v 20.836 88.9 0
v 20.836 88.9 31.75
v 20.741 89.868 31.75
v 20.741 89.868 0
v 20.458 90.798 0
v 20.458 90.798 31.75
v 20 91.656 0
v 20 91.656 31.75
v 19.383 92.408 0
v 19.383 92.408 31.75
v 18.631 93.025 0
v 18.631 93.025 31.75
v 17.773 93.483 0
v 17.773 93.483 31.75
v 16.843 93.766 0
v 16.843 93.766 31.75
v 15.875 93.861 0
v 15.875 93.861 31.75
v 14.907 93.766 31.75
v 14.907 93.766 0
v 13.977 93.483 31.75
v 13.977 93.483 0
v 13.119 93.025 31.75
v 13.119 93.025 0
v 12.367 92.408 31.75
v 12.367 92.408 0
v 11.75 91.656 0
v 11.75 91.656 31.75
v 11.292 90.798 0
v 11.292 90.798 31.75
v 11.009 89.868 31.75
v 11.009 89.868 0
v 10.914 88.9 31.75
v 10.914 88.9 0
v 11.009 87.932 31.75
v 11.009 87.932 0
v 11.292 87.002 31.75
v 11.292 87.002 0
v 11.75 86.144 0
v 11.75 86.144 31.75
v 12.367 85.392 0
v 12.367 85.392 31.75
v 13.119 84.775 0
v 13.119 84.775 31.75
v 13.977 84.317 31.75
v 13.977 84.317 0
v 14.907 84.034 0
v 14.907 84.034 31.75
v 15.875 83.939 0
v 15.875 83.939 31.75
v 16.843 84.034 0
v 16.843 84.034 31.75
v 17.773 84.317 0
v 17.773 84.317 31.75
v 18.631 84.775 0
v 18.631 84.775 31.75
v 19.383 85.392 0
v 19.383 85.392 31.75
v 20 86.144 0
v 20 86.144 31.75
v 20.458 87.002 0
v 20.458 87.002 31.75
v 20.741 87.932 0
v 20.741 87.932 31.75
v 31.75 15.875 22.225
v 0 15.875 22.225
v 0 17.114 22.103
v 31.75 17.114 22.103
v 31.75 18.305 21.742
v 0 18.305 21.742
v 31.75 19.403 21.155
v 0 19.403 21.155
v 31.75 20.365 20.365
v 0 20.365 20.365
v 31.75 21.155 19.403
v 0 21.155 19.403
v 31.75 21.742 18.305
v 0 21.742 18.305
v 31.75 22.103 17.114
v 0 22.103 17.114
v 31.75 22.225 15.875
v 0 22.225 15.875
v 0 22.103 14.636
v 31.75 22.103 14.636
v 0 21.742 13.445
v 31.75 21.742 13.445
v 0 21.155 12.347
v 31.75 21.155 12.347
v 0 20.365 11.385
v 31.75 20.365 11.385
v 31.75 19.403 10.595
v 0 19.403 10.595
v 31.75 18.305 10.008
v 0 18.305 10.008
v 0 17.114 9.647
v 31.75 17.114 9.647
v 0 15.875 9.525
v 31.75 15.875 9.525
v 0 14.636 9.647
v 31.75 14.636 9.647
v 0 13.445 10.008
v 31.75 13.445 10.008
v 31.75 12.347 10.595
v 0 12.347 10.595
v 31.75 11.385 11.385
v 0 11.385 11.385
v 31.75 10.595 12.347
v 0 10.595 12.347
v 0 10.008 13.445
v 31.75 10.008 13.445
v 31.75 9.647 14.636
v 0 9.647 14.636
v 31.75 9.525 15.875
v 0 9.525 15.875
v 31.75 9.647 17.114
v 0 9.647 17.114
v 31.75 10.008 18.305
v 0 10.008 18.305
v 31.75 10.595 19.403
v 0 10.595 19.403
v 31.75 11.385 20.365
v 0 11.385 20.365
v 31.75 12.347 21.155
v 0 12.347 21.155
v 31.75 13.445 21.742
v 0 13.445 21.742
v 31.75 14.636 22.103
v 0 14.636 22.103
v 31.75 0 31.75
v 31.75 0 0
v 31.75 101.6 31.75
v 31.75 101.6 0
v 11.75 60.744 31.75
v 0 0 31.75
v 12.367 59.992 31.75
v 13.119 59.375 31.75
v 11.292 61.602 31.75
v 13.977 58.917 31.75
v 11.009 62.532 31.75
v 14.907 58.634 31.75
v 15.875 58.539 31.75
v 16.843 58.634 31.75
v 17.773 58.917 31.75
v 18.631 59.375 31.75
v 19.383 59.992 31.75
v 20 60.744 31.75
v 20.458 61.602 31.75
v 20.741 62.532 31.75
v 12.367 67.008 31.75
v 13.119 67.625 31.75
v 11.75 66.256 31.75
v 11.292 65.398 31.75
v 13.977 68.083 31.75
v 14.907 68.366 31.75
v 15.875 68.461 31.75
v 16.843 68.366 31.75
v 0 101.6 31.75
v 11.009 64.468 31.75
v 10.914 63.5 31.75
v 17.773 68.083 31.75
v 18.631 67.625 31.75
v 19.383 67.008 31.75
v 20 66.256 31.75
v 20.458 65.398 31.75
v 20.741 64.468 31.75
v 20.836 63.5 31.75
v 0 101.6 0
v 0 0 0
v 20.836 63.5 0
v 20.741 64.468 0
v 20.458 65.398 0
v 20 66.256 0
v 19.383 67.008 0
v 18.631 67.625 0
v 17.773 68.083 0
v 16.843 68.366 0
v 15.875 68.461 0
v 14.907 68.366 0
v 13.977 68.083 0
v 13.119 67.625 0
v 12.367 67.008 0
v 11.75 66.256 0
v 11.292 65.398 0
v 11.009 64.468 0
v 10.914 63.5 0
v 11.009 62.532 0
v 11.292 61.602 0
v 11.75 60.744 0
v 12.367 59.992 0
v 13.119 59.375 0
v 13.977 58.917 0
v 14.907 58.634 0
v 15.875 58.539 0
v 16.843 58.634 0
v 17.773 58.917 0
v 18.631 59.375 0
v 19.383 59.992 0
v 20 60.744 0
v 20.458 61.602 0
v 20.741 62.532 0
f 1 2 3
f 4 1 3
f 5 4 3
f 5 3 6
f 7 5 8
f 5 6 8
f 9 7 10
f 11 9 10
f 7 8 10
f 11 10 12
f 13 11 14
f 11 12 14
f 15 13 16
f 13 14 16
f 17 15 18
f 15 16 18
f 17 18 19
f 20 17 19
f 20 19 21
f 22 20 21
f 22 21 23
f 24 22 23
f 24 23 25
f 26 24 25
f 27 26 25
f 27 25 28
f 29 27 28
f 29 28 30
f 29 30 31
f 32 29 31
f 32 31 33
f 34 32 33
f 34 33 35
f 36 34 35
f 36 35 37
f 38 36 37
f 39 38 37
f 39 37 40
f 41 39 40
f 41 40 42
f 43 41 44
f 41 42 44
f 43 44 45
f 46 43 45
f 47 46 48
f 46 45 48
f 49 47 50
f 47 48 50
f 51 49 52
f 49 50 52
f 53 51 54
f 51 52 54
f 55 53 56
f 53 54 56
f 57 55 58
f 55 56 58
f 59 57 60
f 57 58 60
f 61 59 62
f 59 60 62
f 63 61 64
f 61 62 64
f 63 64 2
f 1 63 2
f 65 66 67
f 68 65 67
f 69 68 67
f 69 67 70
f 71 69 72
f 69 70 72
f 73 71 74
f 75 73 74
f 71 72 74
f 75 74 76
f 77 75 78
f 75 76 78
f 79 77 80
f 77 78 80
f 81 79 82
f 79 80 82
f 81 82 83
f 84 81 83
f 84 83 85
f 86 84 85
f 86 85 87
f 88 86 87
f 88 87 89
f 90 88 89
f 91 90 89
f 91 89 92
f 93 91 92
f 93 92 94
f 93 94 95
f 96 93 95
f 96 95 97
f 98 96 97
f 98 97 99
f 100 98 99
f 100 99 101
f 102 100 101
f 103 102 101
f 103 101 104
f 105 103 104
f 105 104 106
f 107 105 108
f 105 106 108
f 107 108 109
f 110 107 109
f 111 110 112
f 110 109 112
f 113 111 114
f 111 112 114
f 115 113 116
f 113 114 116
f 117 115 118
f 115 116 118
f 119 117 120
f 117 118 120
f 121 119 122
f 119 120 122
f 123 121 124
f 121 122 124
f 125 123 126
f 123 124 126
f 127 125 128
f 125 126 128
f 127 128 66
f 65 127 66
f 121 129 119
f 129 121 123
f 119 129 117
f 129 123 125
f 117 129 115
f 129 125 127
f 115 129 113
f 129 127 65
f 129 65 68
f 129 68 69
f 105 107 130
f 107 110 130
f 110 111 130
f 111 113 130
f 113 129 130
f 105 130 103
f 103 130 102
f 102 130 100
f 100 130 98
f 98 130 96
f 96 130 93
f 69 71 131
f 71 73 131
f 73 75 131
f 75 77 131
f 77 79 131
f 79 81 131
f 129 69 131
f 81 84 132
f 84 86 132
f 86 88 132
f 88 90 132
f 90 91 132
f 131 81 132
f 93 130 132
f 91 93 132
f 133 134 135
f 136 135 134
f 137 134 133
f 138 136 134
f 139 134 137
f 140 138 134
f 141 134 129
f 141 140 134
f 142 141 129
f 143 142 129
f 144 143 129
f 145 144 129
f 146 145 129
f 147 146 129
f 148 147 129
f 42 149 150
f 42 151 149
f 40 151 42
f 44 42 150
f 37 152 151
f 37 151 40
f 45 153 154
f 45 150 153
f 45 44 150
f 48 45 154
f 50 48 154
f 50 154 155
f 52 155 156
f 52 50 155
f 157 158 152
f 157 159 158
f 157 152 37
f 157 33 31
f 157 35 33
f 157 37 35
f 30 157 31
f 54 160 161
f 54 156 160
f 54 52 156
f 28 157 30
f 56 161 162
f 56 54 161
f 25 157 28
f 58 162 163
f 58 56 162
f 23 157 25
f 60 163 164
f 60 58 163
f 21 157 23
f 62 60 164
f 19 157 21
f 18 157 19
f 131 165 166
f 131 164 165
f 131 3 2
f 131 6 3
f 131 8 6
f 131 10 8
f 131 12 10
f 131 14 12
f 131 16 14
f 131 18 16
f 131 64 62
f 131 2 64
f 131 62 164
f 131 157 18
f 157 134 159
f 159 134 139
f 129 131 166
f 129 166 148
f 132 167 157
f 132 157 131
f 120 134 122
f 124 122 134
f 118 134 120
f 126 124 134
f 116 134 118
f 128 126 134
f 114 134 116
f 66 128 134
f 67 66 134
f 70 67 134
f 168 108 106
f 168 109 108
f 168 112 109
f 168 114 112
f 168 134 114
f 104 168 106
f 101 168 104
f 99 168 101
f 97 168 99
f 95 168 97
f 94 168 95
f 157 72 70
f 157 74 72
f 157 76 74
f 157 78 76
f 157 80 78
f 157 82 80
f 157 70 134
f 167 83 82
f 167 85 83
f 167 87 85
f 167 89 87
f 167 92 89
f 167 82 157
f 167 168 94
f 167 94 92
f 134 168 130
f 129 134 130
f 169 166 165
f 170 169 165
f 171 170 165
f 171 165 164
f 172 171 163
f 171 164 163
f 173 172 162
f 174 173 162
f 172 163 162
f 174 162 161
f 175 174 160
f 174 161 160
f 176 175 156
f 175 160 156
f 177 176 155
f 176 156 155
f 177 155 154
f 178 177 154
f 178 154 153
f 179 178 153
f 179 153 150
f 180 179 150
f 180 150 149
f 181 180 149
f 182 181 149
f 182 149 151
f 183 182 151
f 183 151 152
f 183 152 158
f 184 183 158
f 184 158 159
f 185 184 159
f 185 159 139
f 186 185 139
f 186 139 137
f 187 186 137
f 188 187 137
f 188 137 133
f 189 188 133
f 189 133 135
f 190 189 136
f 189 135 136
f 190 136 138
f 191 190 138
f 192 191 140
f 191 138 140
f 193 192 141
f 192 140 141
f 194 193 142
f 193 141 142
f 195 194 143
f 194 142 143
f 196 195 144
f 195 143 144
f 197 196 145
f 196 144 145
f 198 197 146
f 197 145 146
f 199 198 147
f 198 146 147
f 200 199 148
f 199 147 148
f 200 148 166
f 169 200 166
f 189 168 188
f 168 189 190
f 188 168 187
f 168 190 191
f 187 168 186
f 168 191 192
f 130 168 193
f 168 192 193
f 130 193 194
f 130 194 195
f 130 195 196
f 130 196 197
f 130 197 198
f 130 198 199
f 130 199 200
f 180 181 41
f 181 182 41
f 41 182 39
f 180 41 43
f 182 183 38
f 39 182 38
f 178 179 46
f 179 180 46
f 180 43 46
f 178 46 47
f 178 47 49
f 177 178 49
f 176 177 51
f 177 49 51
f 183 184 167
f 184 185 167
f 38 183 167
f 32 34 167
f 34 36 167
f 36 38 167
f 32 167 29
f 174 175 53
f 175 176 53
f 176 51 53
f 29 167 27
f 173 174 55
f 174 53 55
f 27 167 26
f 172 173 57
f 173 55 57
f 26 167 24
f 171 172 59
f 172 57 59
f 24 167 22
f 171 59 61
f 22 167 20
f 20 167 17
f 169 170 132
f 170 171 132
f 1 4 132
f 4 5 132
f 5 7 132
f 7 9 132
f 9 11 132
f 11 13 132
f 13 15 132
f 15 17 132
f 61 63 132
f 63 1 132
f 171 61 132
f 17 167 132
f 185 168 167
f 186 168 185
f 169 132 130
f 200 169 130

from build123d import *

# Parameters (mm, degrees)
SKETCH1_W           = 31.75
SKETCH1_H           = 101.6
BOSS_EXTRUDE1_DEPTH = 31.75
SKETCH2_R           = 4.9609375
CUT_EXTRUDE1_DEPTH  = 112.079633597
SKETCH3_R           = 6.35
CUT_EXTRUDE2_DEPTH  = 112.079633597


with BuildPart() as part:
    # Sketch1 → Boss-Extrude1 (new body)
    with BuildSketch(Plane.XY):
        with Locations((15.875, 50.8)):
            Rectangle(SKETCH1_W, SKETCH1_H)
    extrude(amount=BOSS_EXTRUDE1_DEPTH)

    # Sketch2 → Cut-Extrude1 (cut, through all)
    with BuildSketch(Plane.XY.offset(31.75)):
        with Locations((15.875, 88.9)):
            Circle(SKETCH2_R)
        with Locations((15.875, 63.5)):
            Circle(SKETCH2_R)
    extrude(amount=-CUT_EXTRUDE1_DEPTH, mode=Mode.SUBTRACT)

    # Sketch3 → Cut-Extrude2 (cut, through all)
    with BuildSketch(Plane.ZY):
        with Locations((15.875, 15.875)):
            Circle(SKETCH3_R)
    extrude(amount=-CUT_EXTRUDE2_DEPTH, mode=Mode.SUBTRACT)


solid = part.part
